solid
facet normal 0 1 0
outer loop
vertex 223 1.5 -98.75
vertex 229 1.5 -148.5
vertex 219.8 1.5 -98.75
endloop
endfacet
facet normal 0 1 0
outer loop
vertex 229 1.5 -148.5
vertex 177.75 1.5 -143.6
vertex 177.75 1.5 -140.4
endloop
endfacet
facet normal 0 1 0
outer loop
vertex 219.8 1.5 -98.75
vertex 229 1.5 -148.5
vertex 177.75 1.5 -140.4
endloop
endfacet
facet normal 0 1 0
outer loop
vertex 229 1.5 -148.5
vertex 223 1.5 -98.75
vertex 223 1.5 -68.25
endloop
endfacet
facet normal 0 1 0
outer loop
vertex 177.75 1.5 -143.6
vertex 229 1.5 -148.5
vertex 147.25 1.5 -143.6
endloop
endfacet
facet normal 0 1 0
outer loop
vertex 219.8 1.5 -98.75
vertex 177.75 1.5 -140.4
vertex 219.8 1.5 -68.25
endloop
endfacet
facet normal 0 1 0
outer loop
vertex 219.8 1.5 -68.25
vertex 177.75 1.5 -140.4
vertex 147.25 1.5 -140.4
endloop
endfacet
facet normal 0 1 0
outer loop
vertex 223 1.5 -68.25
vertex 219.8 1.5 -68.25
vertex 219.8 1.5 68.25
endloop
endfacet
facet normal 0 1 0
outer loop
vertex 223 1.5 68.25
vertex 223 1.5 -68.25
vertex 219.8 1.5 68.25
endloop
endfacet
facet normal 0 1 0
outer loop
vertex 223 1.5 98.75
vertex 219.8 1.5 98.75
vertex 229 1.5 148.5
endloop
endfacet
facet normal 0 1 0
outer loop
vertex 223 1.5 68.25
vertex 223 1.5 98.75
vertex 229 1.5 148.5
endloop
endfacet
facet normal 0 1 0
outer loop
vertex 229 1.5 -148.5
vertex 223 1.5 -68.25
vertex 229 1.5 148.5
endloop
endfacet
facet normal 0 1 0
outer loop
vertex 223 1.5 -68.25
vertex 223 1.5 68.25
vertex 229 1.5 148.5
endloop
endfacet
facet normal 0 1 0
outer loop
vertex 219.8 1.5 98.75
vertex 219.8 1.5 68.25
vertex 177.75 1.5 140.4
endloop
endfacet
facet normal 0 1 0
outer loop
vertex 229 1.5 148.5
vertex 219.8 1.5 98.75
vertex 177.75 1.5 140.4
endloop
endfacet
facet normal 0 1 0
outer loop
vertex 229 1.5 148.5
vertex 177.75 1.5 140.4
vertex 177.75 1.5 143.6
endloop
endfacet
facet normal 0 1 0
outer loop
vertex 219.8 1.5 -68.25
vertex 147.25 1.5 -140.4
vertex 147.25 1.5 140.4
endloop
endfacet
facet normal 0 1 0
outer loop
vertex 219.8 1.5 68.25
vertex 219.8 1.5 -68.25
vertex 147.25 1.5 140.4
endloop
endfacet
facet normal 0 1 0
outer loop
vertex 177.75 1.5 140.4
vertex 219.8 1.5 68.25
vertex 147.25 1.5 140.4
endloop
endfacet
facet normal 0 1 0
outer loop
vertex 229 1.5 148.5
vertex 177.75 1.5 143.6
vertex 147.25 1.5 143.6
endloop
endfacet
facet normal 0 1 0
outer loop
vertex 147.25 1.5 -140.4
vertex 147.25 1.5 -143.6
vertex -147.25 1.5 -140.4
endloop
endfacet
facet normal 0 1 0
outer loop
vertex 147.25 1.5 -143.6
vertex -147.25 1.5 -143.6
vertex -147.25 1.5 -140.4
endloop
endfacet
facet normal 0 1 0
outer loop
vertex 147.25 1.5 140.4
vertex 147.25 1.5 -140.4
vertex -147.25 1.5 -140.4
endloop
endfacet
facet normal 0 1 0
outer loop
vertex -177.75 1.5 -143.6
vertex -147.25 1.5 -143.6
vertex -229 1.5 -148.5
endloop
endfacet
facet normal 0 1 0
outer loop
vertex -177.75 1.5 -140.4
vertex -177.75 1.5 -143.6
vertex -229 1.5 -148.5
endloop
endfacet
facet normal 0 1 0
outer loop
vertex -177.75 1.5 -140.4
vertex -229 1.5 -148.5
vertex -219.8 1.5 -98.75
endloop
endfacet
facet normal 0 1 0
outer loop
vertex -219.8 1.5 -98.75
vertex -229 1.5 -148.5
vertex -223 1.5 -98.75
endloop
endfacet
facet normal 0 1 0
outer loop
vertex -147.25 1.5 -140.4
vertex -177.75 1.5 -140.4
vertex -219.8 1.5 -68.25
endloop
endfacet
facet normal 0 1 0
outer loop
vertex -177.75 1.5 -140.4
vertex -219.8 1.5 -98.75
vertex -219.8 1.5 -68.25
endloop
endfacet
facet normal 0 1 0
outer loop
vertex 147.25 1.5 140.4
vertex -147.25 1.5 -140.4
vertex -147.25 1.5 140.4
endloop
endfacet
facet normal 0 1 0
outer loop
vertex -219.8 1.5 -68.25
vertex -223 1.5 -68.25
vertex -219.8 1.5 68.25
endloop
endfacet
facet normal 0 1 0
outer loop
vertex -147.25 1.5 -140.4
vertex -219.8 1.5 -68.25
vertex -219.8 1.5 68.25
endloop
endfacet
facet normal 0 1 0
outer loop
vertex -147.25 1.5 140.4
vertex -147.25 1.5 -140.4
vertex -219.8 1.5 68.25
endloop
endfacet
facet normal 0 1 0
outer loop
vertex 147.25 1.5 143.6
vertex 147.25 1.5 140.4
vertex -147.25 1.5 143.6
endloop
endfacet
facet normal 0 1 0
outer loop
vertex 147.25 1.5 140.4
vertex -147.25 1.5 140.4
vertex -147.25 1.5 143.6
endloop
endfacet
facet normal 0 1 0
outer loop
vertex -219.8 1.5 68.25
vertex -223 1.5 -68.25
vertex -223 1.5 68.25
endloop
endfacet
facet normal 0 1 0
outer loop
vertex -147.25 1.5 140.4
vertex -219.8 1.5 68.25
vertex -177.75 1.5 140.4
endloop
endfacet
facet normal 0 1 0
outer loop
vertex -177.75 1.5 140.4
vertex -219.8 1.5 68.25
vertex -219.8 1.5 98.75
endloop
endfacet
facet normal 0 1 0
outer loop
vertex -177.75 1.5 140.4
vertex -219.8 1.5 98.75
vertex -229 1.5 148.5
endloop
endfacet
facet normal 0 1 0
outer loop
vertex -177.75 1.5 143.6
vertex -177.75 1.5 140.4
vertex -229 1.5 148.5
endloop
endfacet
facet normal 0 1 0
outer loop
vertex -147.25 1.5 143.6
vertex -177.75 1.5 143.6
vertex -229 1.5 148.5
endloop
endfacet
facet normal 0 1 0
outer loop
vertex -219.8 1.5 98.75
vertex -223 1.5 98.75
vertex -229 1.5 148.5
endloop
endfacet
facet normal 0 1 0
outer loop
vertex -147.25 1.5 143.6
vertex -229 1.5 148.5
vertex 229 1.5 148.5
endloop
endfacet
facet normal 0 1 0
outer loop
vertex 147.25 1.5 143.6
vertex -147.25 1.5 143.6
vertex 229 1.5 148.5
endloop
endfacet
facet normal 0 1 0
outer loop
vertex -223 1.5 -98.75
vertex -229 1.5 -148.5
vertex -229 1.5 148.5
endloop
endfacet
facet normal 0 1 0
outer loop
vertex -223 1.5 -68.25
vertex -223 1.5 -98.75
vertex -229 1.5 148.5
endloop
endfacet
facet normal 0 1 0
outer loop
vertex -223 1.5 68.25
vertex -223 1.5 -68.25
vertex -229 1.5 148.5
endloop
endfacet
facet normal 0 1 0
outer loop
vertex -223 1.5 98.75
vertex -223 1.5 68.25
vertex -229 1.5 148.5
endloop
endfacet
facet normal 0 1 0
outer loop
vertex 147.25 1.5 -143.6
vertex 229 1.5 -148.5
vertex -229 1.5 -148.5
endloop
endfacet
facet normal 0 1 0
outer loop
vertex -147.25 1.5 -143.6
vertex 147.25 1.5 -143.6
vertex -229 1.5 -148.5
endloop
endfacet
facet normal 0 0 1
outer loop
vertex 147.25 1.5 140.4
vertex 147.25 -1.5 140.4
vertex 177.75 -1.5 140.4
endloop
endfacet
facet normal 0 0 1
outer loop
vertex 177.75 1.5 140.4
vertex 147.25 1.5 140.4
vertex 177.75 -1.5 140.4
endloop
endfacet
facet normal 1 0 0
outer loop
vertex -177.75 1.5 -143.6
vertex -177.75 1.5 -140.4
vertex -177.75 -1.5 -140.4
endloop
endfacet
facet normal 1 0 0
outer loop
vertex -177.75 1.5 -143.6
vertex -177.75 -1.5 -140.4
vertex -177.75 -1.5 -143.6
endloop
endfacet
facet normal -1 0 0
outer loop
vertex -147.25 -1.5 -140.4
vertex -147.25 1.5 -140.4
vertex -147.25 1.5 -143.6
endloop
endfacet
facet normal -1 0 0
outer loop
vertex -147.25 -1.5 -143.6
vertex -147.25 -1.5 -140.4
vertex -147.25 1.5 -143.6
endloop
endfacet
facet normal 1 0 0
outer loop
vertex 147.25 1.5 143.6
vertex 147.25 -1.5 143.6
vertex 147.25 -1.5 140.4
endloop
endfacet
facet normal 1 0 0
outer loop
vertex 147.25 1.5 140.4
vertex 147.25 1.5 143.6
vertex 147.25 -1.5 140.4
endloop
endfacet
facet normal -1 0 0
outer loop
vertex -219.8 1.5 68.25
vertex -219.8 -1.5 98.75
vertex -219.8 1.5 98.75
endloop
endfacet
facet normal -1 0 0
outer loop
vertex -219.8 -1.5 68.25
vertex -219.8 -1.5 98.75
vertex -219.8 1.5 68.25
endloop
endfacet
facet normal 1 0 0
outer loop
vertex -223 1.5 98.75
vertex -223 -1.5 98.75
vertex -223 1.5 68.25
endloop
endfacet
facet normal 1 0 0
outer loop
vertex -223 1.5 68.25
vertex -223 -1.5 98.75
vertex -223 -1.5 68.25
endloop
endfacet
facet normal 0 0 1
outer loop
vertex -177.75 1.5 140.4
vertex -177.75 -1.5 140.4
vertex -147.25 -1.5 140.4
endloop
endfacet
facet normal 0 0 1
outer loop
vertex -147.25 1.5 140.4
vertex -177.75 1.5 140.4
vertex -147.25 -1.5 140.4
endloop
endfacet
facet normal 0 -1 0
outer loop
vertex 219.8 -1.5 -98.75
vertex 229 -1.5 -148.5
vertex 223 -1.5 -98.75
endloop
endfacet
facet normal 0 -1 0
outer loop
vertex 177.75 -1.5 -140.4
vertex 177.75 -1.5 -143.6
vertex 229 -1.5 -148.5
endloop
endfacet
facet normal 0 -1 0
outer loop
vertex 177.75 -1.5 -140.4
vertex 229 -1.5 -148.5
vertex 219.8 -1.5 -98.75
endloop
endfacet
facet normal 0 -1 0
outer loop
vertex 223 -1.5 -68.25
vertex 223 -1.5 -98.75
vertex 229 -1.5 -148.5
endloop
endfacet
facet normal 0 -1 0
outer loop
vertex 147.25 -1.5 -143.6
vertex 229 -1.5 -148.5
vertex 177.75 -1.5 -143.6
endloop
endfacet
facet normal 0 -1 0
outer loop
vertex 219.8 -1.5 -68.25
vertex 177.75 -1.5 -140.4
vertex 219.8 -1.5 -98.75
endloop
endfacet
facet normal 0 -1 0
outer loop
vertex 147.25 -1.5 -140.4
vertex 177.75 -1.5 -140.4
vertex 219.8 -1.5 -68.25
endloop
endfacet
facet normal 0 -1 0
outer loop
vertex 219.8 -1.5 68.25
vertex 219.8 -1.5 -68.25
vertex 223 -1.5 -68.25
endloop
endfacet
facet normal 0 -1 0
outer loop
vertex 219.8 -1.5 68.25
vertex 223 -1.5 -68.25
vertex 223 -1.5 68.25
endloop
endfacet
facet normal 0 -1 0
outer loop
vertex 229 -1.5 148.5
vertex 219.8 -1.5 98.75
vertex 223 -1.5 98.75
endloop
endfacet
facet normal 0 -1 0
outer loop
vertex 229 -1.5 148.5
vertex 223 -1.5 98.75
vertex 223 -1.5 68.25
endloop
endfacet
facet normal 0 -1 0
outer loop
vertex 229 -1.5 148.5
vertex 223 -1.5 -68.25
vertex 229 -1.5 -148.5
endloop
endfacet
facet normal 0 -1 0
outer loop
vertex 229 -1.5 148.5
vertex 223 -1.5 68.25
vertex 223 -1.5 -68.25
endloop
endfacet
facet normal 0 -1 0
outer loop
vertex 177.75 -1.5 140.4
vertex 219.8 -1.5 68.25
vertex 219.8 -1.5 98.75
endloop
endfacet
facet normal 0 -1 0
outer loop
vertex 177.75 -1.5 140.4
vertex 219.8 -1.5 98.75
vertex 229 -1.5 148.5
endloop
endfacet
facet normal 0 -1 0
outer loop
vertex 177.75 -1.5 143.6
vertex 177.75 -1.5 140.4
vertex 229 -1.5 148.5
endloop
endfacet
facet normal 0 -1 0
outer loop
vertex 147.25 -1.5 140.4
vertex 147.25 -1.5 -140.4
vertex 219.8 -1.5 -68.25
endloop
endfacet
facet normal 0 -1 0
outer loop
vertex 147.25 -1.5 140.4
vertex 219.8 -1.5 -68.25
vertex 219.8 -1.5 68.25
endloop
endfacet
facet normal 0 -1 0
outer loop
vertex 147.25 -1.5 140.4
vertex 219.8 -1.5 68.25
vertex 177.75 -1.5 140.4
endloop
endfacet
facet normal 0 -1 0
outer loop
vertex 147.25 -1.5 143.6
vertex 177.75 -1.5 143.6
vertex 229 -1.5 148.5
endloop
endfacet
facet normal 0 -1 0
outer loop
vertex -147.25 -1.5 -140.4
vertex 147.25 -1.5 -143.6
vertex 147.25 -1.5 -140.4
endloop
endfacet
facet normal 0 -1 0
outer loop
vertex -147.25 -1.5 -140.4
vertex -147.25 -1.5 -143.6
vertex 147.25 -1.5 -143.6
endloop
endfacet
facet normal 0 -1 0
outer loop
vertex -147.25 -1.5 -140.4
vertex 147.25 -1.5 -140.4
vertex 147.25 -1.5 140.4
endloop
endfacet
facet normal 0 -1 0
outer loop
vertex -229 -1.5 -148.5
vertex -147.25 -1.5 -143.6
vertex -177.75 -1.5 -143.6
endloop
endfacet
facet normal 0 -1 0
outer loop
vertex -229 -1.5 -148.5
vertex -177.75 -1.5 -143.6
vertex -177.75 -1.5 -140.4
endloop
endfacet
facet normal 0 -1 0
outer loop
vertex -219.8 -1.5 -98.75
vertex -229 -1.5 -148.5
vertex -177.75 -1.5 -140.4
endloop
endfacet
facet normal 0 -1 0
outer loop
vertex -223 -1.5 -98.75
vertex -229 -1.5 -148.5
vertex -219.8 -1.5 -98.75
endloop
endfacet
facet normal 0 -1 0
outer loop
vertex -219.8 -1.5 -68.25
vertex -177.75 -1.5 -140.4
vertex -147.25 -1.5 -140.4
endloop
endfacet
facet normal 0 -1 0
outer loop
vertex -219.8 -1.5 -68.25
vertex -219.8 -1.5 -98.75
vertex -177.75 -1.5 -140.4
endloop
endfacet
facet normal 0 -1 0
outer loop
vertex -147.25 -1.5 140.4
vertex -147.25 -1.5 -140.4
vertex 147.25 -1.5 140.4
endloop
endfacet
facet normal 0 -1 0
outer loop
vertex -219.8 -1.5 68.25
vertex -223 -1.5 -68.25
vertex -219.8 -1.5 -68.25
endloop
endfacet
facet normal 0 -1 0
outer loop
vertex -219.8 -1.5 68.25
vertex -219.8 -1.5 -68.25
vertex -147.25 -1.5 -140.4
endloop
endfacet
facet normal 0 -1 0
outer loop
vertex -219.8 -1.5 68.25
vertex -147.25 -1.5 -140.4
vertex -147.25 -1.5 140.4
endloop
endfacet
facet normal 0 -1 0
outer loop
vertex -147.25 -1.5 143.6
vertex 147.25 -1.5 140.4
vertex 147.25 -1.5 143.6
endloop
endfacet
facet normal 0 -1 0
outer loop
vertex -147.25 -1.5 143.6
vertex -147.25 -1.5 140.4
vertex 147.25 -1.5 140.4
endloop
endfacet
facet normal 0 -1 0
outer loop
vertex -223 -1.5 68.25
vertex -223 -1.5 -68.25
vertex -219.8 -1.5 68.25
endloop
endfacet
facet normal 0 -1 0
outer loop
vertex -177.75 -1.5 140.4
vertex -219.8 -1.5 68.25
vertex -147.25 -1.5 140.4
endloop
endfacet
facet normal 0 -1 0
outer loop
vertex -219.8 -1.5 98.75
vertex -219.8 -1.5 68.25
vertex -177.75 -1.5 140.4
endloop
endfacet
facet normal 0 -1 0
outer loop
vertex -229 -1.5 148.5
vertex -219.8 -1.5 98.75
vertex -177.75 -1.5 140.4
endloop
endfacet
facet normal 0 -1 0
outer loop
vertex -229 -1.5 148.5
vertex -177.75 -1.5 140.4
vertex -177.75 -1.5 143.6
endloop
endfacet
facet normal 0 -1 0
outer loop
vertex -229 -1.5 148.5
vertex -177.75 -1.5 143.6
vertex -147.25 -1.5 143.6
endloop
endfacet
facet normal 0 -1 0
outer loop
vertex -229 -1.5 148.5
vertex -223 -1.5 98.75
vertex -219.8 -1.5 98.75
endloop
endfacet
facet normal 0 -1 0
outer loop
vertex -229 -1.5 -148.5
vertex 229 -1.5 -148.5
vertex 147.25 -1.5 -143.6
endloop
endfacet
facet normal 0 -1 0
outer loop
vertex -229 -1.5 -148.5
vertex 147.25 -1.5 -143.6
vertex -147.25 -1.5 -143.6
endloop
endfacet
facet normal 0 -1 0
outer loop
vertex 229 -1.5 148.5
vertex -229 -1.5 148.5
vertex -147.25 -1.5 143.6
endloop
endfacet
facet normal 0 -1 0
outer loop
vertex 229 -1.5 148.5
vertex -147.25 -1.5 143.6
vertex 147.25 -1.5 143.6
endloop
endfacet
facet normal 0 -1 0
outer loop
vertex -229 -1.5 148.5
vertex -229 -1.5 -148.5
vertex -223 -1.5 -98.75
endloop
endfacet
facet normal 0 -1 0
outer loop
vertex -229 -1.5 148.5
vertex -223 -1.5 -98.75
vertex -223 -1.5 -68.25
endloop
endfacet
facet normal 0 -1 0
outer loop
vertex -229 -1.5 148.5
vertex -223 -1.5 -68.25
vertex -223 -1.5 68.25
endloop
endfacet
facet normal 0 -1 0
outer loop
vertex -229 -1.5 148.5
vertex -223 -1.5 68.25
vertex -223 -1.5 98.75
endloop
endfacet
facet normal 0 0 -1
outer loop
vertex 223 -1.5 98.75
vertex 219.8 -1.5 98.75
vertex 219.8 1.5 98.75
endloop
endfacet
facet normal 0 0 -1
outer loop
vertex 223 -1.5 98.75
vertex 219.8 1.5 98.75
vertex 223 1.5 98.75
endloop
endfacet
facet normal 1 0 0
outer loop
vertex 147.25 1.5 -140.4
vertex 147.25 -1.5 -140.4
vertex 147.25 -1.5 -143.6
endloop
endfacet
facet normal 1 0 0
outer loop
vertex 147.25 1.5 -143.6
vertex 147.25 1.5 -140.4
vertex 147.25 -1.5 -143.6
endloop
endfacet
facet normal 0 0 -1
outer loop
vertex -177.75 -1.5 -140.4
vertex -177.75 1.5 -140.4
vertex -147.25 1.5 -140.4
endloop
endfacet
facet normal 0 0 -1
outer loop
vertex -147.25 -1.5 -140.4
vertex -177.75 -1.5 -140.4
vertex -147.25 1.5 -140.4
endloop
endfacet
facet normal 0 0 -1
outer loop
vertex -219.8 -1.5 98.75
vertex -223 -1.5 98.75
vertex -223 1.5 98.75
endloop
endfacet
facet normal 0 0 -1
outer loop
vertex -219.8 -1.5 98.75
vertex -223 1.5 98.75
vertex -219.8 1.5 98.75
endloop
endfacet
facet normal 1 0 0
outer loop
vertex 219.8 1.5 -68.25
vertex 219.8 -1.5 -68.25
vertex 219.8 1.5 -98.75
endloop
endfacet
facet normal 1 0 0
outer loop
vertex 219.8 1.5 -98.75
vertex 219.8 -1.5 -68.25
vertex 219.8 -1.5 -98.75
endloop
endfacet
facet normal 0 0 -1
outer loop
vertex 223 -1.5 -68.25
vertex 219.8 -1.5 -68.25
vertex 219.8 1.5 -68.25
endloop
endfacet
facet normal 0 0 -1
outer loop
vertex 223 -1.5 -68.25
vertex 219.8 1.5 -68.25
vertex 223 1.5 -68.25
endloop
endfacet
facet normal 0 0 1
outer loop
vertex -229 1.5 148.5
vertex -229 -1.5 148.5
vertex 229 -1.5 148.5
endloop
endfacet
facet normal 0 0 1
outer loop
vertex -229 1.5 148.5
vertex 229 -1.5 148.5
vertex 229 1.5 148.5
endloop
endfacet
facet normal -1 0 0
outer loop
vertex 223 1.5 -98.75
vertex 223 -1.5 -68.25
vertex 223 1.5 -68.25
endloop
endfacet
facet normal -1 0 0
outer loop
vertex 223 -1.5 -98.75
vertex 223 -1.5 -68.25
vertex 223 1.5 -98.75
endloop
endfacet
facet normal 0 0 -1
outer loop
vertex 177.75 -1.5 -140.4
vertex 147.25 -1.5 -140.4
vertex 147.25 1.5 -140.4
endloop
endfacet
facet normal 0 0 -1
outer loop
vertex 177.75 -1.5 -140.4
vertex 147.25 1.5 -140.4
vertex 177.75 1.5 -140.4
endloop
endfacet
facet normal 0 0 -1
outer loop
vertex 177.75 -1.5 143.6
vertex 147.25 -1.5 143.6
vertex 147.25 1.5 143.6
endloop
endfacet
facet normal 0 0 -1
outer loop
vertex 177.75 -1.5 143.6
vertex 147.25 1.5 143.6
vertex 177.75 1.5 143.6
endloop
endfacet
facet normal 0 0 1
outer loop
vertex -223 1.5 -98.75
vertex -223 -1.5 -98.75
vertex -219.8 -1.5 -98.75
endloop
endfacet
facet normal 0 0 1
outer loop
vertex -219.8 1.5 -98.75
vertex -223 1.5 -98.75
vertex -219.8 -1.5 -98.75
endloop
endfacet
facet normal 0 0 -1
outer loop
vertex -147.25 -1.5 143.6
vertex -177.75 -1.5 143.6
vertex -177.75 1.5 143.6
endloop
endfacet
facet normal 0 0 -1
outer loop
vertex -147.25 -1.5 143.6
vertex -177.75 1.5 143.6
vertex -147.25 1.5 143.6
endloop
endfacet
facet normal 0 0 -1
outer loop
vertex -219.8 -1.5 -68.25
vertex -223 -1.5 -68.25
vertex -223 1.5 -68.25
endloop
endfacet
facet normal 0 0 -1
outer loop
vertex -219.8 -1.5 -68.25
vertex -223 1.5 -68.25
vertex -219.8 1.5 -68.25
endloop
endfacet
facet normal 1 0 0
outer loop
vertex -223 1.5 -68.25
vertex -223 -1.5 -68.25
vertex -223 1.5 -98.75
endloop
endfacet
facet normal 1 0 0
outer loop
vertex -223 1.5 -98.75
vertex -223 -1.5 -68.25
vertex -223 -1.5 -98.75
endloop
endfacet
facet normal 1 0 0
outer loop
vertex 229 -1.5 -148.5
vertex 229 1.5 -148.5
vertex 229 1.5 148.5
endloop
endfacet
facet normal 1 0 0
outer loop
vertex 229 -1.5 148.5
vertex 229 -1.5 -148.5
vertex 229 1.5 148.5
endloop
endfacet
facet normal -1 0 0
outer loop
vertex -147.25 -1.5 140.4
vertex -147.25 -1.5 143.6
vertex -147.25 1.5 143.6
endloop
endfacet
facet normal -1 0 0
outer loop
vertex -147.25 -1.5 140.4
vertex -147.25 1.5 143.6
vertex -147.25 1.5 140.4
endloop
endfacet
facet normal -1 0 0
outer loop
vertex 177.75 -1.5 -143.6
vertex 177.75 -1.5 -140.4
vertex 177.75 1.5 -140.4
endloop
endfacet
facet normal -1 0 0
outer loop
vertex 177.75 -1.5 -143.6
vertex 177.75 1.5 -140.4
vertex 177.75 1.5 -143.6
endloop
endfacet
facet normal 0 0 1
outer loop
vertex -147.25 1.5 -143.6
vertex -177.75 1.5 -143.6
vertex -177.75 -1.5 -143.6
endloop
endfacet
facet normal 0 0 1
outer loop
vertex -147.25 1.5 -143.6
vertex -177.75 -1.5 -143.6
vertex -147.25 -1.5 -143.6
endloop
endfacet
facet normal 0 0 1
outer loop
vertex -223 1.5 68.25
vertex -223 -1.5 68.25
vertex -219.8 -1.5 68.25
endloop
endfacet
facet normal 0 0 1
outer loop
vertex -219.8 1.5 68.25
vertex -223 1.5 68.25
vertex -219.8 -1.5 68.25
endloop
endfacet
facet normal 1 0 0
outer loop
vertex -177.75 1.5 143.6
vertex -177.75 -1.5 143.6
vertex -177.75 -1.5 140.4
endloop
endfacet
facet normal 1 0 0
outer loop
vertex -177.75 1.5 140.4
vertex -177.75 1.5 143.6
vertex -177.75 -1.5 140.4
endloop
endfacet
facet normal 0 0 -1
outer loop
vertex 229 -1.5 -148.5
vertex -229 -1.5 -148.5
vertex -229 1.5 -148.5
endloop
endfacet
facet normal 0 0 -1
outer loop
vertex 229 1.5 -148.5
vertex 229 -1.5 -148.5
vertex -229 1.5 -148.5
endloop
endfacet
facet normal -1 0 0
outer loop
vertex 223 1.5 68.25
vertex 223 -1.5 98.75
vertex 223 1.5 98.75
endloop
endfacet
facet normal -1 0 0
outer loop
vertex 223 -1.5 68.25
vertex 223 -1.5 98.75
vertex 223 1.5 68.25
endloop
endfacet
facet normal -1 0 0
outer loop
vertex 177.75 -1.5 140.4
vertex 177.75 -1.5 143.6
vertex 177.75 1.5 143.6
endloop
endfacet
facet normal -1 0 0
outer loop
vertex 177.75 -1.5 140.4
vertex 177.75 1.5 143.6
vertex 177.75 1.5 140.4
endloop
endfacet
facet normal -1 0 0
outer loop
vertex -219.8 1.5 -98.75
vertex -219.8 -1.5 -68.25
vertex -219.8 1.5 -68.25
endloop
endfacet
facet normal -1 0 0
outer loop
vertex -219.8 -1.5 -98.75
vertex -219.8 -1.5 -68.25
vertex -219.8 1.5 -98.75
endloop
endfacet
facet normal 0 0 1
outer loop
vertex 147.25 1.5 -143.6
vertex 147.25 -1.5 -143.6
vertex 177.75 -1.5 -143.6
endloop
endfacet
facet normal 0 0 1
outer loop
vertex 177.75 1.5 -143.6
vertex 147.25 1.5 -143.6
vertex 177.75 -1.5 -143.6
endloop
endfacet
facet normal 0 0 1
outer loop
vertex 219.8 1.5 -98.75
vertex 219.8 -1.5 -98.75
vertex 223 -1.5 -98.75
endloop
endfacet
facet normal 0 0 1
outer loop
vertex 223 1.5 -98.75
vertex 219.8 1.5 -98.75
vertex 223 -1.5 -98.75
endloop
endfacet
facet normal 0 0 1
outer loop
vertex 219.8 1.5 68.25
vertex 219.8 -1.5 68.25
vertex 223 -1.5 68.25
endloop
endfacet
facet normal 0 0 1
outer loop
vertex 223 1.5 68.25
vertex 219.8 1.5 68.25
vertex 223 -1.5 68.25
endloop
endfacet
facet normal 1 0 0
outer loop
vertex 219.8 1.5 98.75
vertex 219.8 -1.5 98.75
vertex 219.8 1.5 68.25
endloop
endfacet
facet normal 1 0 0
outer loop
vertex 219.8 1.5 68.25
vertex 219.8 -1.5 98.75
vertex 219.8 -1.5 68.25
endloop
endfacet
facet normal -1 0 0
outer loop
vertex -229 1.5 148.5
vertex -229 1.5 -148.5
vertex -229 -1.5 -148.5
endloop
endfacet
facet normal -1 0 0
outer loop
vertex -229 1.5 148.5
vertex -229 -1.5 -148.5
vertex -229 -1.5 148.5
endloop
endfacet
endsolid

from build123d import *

# Parameters (mm, degrees)
CROQUIS1_W              = 455
CROQUIS1_H              = 297
SALIENTE_EXTRUIR1_DEPTH = 1.5
CROQUIS2_W              = 30.5
CROQUIS2_H              = 3.2
CROQUIS2_W_2            = 3.2
CROQUIS2_H_2            = 30.5
CORTAR_EXTRUIR1_DEPTH   = 5
CROQUIS3_W              = 297
CROQUIS3_H              = 3
SALIENTE_EXTRUIR2_DEPTH = 1.5


with BuildPart() as part:
    # Croquis1 → Saliente-Extruir1 (new, symmetric)
    with BuildSketch(Plane(origin=(0, 0, 0), x_dir=(1, 0, 0), z_dir=(0, 1, 0))):
        Rectangle(CROQUIS1_W, CROQUIS1_H)
    extrude(amount=SALIENTE_EXTRUIR1_DEPTH, both=True)

    # Croquis2 → Cortar-Extruir1 (cut, symmetric)
    with BuildSketch(Plane(origin=(0, 1.5, 0), x_dir=(1, 0, 0), z_dir=(0, 1, 0))):
        with Locations((-162.5, -142)):
            Rectangle(CROQUIS2_W, CROQUIS2_H)
        with Locations((-221.4, -83.5)):
            Rectangle(CROQUIS2_W_2, CROQUIS2_H_2)
        with Locations((221.4, -83.5)):
            Rectangle(CROQUIS2_W_2, CROQUIS2_H_2)
        with Locations((162.5, -142)):
            Rectangle(CROQUIS2_W, CROQUIS2_H)
        with Locations((162.5, 142)):
            Rectangle(CROQUIS2_W, CROQUIS2_H)
        with Locations((221.4, 83.5)):
            Rectangle(CROQUIS2_W_2, CROQUIS2_H_2)
        with Locations((-221.4, 83.5)):
            Rectangle(CROQUIS2_W_2, CROQUIS2_H_2)
        with Locations((-162.5, 142)):
            Rectangle(CROQUIS2_W, CROQUIS2_H)
    extrude(amount=CORTAR_EXTRUIR1_DEPTH, both=True, mode=Mode.SUBTRACT)

    # Croquis3 → Saliente-Extruir2 (add)
    with BuildSketch(Plane.ZY.offset(227.5)):
        Rectangle(CROQUIS3_W, CROQUIS3_H)
    saliente_extruir2 = extrude(amount=SALIENTE_EXTRUIR2_DEPTH)

    # Simetría1: Saliente-Extruir2 across plane
    add(saliente_extruir2.mirror(Plane(origin=(0, 0, 0), x_dir=(0, 0, 1), z_dir=(1, 0, 0))))


solid = part.part
